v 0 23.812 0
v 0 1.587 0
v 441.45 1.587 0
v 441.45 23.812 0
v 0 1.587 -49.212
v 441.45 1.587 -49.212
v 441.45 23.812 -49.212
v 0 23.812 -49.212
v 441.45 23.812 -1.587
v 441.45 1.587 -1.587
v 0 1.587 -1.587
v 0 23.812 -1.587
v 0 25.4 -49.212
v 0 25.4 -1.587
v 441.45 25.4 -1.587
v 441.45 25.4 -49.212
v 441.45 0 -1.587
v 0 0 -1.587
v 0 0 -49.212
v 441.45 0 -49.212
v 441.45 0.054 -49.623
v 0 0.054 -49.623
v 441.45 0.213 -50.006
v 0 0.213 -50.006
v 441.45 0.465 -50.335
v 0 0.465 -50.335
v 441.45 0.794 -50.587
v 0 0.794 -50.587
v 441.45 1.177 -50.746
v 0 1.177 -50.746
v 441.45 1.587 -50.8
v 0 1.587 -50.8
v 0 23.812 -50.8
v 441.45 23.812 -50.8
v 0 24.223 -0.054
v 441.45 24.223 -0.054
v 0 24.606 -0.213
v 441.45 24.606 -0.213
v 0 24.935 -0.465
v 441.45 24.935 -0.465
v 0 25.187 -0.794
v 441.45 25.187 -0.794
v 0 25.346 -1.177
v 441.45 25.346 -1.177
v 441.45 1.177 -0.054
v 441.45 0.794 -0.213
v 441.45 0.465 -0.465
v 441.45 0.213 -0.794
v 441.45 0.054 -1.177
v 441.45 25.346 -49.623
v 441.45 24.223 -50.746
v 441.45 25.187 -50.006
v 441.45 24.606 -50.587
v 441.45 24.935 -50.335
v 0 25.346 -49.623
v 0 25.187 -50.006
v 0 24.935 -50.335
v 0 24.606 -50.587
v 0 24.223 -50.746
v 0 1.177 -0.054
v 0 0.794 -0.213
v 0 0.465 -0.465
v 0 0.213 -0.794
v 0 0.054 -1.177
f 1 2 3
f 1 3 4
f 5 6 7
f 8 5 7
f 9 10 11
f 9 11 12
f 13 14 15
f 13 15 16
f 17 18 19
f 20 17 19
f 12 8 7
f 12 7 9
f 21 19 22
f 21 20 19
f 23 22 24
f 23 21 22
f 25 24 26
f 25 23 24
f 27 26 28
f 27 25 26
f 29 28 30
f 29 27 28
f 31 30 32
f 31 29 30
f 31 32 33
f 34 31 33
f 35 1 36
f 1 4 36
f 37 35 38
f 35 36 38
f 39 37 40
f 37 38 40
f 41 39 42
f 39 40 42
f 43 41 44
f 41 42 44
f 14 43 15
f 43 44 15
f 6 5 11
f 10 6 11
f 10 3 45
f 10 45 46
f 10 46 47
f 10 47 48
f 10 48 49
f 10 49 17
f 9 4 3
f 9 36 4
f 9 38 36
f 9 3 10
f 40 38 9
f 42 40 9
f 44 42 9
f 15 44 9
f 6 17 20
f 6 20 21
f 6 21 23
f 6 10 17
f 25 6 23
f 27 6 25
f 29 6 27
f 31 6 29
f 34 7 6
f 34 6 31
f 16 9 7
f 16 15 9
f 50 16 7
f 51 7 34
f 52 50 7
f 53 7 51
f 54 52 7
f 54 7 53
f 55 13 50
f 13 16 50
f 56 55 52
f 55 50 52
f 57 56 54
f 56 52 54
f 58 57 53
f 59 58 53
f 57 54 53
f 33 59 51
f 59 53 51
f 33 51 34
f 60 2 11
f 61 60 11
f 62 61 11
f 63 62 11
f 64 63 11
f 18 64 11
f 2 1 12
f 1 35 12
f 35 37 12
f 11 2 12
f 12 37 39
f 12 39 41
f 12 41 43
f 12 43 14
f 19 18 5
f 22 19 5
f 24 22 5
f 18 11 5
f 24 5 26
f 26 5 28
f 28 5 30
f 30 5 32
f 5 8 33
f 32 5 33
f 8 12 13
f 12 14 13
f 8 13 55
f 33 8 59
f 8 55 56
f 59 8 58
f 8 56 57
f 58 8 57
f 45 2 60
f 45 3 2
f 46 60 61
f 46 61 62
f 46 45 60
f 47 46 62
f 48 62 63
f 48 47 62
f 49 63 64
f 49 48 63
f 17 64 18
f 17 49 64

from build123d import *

# Parameters (mm, degrees)
SKETCH1_W           = 50.8
SKETCH1_H           = 25.4
BOSS_EXTRUDE1_DEPTH = 441.450000004
SKETCH2_W           = 47.625
SKETCH2_H           = 22.225
CUT_EXTRUDE1_DEPTH  = 441.45
FILLET1_R           = 1.5875


with BuildPart() as part:
    # Sketch1 → Boss-Extrude1 (new body)
    with BuildSketch(Plane(origin=(0, 0, 0), x_dir=(0, 0, -1), z_dir=(1, 0, 0))):
        with Locations((25.4, 12.7)):
            Rectangle(SKETCH1_W, SKETCH1_H)
    extrude(amount=BOSS_EXTRUDE1_DEPTH)

    # Sketch2 → Cut-Extrude1 (cut)
    with BuildSketch(Plane.ZY):
        with Locations((-25.4, 12.7)):
            Rectangle(SKETCH2_W, SKETCH2_H)
    extrude(amount=-CUT_EXTRUDE1_DEPTH, mode=Mode.SUBTRACT)

    # Fillet1
    fillet1_edges = [part.edges().sort_by_distance(p)[0] for p in [
        (220.725000002, 25.4, 0),
        (220.725000002, 25.4, -50.8),
        (220.725000002, 0, -50.8),
        (220.725000002, 0, 0),
    ]]
    fillet(fillet1_edges, radius=FILLET1_R)


solid = part.part
